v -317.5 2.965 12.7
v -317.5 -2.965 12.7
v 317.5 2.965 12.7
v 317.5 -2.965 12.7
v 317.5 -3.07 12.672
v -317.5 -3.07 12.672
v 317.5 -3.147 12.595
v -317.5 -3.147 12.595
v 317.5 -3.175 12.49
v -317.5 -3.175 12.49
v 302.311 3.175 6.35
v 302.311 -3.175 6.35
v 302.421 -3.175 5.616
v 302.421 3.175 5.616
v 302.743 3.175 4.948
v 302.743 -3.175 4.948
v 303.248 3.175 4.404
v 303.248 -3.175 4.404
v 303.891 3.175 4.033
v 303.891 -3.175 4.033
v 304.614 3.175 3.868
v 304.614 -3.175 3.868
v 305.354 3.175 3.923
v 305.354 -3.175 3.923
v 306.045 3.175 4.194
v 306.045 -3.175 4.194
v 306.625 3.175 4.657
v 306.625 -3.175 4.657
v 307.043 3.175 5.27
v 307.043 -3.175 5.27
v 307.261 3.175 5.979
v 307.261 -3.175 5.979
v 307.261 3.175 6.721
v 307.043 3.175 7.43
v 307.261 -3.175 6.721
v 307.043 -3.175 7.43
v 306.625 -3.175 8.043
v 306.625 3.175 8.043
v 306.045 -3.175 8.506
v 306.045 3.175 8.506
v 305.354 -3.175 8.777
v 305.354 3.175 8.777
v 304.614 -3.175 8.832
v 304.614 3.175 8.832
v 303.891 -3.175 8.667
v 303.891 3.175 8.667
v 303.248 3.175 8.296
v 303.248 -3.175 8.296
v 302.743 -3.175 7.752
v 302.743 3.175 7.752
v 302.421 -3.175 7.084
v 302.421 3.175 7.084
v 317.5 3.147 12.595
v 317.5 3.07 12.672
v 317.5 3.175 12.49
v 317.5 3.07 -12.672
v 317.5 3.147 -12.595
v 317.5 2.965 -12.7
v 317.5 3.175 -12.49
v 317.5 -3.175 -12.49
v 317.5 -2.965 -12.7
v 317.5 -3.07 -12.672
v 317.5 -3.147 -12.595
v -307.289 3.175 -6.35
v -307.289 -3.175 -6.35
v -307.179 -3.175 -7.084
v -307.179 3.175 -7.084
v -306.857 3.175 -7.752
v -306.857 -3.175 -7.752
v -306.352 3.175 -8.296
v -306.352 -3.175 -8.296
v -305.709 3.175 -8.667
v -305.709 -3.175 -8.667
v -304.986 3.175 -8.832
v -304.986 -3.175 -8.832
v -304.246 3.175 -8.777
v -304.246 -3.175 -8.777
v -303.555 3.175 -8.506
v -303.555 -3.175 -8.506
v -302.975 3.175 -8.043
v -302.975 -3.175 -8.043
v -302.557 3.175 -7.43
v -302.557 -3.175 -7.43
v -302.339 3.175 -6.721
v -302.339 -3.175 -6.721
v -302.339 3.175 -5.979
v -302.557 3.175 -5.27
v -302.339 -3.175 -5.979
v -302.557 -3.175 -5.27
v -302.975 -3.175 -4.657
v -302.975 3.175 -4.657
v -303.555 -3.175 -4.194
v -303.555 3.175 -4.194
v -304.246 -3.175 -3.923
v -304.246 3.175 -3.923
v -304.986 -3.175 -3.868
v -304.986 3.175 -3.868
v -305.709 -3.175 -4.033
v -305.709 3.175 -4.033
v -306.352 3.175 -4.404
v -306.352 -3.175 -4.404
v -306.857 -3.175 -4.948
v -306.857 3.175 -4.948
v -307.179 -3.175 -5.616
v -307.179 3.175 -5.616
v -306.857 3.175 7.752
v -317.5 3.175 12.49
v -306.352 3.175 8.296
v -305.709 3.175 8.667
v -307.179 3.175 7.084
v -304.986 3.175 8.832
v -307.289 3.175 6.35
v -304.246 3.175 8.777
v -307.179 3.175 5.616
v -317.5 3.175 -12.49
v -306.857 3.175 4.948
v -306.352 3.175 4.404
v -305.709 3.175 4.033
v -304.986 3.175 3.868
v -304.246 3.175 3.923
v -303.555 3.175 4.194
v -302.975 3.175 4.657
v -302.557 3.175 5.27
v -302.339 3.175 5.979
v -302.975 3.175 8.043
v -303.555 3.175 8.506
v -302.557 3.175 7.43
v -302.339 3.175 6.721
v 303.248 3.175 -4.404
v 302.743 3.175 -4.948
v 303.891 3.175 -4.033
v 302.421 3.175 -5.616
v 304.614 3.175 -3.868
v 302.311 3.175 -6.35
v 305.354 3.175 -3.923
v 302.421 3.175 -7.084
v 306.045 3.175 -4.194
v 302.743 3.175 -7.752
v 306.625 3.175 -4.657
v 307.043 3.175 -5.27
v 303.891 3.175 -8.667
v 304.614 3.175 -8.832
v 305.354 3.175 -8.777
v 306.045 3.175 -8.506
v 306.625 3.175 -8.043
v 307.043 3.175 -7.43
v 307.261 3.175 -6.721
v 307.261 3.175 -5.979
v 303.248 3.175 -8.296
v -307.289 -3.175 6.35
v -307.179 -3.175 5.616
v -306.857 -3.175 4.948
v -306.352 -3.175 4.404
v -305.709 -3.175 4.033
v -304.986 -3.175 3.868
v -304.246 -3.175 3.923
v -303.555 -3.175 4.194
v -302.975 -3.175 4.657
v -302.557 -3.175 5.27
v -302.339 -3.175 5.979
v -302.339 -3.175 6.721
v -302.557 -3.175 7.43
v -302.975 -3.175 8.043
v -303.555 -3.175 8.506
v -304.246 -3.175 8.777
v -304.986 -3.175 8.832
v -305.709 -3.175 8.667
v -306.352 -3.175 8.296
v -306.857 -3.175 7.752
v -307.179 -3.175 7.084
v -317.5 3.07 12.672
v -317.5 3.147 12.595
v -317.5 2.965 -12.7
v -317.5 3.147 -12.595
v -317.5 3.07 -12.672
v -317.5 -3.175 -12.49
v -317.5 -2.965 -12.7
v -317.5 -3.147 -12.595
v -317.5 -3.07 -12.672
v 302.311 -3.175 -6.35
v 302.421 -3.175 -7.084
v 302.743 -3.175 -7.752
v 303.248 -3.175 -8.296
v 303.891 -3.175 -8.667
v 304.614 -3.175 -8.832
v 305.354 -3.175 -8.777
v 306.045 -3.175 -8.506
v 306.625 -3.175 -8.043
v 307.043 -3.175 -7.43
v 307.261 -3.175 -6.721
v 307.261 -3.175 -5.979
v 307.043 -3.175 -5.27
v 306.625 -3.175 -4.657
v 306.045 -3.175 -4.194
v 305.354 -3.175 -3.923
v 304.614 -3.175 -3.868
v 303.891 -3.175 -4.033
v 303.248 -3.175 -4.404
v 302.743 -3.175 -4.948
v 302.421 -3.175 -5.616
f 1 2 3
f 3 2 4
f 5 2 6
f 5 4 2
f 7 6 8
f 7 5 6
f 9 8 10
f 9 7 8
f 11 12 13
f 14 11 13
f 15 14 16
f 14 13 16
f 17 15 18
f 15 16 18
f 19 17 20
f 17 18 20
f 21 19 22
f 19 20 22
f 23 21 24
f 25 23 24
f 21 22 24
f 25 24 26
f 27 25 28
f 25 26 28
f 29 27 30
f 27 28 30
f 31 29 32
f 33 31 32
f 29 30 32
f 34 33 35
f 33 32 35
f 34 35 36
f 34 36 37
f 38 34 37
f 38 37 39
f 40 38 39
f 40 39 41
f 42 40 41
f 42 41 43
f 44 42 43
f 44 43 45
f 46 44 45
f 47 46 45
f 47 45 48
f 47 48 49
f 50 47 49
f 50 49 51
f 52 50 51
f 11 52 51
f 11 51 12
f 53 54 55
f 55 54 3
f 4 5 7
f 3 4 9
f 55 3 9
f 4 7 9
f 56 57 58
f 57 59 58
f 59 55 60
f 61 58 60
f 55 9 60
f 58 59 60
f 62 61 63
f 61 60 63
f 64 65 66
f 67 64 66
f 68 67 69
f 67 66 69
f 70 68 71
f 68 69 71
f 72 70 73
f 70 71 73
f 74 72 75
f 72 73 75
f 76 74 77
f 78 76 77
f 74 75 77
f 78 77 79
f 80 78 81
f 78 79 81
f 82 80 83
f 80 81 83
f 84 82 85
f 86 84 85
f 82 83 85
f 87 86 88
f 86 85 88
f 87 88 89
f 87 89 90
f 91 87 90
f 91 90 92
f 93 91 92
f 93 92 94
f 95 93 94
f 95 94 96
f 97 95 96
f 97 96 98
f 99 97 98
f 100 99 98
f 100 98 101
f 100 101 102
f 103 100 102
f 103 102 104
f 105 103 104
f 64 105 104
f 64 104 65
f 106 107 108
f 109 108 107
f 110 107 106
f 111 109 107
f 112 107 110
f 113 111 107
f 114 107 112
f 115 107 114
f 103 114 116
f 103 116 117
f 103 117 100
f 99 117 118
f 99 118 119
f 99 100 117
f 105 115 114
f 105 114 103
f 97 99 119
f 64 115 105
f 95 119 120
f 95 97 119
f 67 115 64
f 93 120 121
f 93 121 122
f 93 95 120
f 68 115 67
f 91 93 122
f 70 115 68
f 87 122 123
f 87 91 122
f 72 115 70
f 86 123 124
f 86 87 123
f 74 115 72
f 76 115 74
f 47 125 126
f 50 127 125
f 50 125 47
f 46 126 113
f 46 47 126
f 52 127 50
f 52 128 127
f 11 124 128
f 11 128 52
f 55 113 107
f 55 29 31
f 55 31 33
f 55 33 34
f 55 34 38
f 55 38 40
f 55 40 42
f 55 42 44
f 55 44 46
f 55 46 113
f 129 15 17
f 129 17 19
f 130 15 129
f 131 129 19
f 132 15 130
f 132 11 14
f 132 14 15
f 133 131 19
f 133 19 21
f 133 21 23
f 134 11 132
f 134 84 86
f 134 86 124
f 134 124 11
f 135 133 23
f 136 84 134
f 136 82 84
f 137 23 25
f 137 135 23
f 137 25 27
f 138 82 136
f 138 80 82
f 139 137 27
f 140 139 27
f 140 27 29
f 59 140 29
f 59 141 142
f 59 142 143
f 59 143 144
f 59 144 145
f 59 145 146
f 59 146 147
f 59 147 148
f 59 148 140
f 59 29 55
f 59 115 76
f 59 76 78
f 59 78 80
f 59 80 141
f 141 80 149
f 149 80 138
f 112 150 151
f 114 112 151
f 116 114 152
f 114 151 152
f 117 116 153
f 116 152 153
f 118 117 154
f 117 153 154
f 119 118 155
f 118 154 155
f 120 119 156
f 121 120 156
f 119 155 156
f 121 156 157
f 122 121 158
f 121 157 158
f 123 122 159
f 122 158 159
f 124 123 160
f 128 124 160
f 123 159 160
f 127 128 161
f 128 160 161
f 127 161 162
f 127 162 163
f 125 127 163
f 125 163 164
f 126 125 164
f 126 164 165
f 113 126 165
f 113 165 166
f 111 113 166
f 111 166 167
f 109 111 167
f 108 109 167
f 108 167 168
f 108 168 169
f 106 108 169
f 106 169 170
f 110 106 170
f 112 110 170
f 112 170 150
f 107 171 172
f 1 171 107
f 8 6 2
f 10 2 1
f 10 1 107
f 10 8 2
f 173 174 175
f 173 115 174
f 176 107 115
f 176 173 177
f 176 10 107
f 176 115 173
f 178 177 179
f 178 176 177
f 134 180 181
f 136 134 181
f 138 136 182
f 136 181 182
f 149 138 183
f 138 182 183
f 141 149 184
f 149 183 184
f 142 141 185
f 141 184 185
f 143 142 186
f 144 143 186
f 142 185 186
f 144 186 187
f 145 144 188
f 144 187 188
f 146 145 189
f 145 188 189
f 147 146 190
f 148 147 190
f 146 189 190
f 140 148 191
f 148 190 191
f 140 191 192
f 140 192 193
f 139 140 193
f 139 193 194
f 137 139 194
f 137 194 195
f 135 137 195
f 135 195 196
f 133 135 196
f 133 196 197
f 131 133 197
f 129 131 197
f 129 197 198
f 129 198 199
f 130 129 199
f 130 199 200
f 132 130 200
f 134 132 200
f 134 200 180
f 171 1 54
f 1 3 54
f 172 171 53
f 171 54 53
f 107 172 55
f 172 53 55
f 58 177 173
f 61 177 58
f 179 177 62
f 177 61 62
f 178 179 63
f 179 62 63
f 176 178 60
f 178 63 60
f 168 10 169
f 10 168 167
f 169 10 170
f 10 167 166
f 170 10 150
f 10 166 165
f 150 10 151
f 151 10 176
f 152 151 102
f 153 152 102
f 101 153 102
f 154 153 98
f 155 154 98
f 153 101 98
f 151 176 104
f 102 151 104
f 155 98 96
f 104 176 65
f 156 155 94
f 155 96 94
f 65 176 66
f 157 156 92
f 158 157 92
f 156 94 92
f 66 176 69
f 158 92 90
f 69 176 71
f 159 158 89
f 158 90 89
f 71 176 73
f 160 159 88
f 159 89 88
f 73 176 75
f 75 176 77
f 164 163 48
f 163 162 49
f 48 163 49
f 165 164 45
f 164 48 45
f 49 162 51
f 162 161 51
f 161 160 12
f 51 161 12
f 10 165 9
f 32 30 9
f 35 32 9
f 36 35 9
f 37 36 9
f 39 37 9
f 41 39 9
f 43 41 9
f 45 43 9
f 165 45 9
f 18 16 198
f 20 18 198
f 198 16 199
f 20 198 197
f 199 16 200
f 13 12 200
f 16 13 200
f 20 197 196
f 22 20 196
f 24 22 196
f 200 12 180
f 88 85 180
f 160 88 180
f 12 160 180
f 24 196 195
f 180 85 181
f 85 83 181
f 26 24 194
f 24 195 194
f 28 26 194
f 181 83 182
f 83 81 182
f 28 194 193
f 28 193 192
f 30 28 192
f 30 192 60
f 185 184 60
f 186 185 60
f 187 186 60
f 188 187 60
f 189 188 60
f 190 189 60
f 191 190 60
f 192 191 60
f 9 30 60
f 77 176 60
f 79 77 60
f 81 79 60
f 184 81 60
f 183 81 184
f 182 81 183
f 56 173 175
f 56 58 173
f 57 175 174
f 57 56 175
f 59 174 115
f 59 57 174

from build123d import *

# Parameters (mm, degrees)
BOSS_EXTRUDE1_DEPTH      = 3.175
BOSS_EXTRUDE1_DEPTH_BACK = 3.175
SKETCH3_W                = 635
SKETCH3_H                = 25.4
FILLET1_R                = 0.20955
F_10_CLEARANCE_HOLE1_D   = 4.9784


with BuildPart() as part:
    # Sketch3 → Boss-Extrude1 (new, two sides: drawn at the far end of the back side and taken through both)
    with BuildSketch(Plane(origin=(0, 0, 0), x_dir=(1, 0, 0), z_dir=(0, 1, 0)).offset(-BOSS_EXTRUDE1_DEPTH_BACK)):
        Rectangle(SKETCH3_W, SKETCH3_H)
    extrude(amount=BOSS_EXTRUDE1_DEPTH + BOSS_EXTRUDE1_DEPTH_BACK)

    # Fillet1
    fillet1_edges = [part.edges().sort_by_distance(p)[0] for p in [
        (0, 3.175, 12.7),
        (0, -3.175, -12.7),
        (0, 3.175, -12.7),
        (0, -3.175, 12.7),
    ]]
    fillet(fillet1_edges, radius=FILLET1_R)

    # #10 Clearance Hole1 (through all)
    with Locations(Plane(origin=(0, 3.175, 0), x_dir=(1, 0, 0), z_dir=(0, 1, 0))):
        with Locations((304.8, -6.35), (-304.8, -6.35), (304.8, 6.35), (-304.8, 6.35)):
            Hole(F_10_CLEARANCE_HOLE1_D / 2)


solid = part.part
